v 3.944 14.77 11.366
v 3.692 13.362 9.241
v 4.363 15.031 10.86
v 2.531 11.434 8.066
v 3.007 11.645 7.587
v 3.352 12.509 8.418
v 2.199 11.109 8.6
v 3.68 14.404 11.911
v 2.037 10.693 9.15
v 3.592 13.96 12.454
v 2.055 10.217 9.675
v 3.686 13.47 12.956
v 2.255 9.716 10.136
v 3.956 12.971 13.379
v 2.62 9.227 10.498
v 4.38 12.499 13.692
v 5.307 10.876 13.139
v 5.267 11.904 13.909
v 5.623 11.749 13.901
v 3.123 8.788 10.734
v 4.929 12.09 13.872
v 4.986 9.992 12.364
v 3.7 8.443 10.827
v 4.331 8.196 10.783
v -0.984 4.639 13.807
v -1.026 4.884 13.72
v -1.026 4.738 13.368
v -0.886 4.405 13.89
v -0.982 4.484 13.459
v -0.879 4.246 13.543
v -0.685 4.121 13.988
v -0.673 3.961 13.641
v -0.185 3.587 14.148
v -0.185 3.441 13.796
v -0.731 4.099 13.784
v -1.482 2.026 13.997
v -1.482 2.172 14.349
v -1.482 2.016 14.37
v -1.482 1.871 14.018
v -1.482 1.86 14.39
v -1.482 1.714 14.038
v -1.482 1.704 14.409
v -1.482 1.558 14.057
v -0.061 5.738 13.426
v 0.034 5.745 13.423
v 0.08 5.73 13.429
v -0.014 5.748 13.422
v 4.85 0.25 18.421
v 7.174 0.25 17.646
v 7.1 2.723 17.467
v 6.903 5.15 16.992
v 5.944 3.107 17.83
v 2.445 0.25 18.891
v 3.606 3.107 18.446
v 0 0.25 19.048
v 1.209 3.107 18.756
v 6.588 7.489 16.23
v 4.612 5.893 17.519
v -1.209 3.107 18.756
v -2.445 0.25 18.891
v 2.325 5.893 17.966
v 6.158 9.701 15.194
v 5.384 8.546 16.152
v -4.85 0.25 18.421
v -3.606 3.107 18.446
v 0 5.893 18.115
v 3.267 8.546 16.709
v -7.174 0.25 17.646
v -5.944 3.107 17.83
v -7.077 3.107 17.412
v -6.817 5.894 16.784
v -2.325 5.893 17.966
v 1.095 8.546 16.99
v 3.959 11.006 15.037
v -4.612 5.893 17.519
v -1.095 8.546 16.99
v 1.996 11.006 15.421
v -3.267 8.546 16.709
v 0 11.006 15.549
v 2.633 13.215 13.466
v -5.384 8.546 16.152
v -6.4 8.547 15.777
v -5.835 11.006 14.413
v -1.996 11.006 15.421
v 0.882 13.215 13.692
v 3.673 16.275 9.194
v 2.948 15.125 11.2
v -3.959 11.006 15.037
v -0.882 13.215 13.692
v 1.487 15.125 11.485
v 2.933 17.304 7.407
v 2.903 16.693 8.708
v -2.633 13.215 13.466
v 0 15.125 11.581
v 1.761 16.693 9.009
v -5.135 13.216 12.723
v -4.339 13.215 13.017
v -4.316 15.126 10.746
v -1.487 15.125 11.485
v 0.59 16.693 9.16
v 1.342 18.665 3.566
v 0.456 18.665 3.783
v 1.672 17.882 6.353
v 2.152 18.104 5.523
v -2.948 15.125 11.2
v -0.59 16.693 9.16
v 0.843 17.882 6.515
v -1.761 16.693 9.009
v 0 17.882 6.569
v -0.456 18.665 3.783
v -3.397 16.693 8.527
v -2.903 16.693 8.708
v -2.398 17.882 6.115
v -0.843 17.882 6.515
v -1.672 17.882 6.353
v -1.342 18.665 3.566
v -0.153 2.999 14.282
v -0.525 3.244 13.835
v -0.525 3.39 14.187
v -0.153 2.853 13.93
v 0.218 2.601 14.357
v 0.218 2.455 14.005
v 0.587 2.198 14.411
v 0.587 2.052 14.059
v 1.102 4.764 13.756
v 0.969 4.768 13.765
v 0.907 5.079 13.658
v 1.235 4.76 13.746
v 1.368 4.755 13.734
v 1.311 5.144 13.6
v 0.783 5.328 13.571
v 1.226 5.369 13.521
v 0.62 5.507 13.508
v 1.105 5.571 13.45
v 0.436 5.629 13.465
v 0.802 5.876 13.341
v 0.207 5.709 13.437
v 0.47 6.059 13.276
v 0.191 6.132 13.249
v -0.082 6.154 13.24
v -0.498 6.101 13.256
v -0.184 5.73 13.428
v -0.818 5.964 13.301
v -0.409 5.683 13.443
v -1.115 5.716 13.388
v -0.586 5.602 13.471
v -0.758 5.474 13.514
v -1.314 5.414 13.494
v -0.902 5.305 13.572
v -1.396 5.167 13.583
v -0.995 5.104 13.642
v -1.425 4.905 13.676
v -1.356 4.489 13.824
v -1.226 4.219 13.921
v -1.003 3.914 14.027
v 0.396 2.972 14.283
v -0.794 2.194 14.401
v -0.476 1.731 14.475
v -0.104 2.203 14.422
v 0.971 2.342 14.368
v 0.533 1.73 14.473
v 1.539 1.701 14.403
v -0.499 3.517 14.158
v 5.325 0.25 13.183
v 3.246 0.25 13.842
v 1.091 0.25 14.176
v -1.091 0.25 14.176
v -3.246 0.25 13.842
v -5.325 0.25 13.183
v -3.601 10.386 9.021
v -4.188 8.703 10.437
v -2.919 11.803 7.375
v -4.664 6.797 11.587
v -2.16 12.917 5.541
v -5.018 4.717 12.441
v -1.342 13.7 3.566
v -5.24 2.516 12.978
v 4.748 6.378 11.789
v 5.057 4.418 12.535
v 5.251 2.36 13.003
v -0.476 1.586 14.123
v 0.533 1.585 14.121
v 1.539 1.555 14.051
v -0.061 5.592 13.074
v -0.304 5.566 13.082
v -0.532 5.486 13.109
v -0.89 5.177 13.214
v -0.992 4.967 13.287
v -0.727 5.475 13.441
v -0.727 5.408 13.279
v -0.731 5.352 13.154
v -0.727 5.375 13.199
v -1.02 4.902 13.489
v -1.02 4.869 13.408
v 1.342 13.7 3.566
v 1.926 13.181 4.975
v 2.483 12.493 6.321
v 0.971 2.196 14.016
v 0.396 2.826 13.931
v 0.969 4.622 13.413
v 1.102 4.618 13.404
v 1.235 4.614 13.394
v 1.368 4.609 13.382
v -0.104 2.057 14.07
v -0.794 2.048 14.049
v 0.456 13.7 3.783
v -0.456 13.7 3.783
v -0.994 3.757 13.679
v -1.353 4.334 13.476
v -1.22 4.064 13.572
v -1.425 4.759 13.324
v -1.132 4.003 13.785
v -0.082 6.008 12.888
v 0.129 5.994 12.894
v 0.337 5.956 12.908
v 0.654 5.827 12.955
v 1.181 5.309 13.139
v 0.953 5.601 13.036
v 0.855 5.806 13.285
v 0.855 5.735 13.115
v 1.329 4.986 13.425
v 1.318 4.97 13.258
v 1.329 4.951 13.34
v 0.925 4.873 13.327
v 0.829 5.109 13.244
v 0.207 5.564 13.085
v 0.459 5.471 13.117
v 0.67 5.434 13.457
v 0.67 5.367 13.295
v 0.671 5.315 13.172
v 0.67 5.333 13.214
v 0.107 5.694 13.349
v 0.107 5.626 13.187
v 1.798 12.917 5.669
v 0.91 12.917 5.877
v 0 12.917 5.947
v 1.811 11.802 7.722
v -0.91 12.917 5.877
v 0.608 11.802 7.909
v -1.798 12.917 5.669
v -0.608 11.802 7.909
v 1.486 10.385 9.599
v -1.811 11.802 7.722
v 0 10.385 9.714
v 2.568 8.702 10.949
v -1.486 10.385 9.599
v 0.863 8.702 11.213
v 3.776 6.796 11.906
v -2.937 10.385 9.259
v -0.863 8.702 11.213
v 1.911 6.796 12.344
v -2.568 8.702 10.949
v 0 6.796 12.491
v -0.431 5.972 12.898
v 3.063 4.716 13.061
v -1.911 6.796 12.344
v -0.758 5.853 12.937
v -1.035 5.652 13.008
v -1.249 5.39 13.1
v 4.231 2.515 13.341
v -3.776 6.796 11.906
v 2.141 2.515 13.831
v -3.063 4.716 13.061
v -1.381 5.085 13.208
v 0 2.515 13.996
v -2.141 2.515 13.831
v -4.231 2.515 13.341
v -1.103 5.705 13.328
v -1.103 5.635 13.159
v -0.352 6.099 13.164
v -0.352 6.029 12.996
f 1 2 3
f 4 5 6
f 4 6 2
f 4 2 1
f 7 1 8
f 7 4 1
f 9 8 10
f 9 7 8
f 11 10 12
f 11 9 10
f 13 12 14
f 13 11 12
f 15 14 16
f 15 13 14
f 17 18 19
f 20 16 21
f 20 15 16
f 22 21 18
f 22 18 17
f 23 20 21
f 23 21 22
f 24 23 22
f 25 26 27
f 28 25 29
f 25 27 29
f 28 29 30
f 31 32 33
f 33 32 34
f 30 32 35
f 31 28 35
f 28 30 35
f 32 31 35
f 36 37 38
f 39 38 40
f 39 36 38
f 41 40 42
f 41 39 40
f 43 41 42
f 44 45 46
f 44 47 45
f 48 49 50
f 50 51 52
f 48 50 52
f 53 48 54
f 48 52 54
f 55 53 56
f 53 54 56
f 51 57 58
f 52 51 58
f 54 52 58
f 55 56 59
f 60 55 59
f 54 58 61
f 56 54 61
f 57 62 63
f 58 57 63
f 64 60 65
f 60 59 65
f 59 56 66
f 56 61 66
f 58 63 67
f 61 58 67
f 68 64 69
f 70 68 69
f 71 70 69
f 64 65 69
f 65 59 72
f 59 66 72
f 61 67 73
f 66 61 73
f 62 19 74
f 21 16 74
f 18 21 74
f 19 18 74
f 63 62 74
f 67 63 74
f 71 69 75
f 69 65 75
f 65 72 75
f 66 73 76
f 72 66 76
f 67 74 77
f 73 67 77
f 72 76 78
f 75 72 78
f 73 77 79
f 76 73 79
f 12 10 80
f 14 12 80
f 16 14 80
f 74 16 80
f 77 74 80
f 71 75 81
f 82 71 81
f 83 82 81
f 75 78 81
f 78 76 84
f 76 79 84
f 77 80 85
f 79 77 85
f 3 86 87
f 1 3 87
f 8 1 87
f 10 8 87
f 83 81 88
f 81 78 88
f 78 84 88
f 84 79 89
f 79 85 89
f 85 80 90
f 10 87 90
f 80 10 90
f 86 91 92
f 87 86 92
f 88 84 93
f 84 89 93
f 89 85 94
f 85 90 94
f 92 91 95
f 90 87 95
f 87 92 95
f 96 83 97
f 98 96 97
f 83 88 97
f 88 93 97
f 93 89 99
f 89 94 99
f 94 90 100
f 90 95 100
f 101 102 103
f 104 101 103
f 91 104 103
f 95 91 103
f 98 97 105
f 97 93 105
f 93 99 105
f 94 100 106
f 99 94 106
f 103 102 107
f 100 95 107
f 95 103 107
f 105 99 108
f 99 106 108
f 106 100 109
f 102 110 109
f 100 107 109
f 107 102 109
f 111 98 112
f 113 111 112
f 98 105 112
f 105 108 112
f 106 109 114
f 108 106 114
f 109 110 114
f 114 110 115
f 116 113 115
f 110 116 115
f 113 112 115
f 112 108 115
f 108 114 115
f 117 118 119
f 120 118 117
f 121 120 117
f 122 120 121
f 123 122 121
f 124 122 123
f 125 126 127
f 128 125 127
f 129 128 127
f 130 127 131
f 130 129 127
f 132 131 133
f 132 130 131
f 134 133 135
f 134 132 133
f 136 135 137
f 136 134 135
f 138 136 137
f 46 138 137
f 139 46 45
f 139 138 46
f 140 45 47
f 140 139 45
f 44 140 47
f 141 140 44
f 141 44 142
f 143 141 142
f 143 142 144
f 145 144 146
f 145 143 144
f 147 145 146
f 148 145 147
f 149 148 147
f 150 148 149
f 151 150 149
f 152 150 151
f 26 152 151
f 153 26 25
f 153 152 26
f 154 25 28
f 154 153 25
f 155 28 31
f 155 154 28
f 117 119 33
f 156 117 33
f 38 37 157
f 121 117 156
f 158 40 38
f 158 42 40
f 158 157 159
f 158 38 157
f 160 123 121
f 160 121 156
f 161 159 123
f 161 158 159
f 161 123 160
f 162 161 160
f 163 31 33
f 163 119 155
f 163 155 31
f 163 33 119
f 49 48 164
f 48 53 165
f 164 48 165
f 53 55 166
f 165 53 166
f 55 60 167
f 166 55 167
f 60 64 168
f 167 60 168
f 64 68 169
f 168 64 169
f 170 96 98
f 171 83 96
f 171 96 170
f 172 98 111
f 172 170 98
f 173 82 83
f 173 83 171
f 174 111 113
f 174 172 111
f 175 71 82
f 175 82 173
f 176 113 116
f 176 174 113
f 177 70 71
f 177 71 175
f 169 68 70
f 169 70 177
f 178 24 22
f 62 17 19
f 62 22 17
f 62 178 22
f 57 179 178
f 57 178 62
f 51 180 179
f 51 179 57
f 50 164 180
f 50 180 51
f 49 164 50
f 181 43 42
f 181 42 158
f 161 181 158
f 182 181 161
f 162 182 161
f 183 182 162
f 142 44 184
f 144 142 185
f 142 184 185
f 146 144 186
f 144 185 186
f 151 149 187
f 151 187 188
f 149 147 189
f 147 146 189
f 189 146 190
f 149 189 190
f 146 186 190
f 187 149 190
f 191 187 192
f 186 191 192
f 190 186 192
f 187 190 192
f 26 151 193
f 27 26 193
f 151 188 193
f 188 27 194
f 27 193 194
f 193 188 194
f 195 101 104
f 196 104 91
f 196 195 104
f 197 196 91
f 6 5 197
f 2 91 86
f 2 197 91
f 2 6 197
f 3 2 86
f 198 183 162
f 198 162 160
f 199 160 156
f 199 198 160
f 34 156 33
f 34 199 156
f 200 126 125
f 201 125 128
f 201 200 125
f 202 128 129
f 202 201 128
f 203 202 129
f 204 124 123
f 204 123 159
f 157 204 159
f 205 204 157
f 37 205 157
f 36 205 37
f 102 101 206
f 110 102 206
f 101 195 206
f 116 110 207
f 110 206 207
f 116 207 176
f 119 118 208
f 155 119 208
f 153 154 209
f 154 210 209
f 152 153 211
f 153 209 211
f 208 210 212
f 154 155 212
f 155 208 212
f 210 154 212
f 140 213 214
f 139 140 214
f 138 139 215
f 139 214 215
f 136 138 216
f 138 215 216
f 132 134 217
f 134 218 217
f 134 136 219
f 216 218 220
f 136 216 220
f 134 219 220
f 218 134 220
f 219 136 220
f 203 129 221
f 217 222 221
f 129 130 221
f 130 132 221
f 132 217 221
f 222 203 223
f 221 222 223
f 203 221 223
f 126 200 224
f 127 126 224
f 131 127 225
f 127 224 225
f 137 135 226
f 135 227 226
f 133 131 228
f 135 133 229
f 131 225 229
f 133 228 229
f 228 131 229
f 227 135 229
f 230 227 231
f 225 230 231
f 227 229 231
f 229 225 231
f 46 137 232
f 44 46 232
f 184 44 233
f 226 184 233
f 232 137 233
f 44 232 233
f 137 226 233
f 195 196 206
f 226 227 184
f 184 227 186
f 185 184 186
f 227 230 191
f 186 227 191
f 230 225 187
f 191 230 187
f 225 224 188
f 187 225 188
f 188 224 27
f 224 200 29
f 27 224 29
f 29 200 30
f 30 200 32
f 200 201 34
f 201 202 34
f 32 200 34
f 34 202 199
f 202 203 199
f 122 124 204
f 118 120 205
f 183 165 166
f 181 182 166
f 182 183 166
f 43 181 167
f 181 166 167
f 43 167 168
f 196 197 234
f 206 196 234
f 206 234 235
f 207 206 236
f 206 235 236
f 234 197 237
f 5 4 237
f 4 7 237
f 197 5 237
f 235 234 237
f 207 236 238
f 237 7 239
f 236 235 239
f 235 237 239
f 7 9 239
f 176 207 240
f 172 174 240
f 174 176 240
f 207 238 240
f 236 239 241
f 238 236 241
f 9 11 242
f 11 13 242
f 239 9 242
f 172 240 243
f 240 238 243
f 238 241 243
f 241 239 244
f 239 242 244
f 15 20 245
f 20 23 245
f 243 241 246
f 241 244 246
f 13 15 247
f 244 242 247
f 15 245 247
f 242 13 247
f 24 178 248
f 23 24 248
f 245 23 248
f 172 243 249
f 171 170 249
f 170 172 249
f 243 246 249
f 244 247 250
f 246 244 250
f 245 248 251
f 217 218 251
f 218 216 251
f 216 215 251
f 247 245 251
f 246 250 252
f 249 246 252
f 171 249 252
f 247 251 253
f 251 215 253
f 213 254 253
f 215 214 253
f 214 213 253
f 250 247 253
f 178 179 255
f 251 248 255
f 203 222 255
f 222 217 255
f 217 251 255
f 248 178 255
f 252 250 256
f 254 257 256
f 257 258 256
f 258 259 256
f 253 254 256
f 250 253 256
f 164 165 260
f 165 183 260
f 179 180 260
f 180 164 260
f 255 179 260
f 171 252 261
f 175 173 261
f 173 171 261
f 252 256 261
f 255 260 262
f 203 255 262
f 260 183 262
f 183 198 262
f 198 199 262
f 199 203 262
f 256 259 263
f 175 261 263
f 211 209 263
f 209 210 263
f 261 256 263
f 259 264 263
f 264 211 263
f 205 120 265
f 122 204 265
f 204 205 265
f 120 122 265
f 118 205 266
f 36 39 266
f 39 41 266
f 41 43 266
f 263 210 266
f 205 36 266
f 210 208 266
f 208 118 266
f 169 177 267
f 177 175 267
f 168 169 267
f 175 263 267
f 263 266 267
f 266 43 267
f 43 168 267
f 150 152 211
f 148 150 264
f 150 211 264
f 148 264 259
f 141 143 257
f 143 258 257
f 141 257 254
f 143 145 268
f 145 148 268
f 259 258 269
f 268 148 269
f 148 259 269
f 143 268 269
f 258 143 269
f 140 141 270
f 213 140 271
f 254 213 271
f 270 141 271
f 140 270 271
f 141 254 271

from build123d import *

# Parameters (mm, degrees)
REVOLVE1_ANGLE          = 45
CUT_EXTRUDE1_DEPTH      = 28.647117169
CUT_EXTRUDE1_DEPTH_BACK = 28.647117169
CUT_EXTRUDE4_START      = 13.576367639
CUT_EXTRUDE4_DEPTH      = 0.380999994
CUT_EXTRUDE4_START_2    = 13.957367633
CUT_EXTRUDE4_2_DEPTH    = 0.642564002
CUT_EXTRUDE5_DEPTH      = 28.732730484
CUT_EXTRUDE5_DEPTH_BACK = 28.732730484
SKETCH9_R               = 2.6035


with BuildPart() as part:
    # Sketch1 → Revolve1 (revolve, symmetric)
    with BuildSketch(Plane(origin=(0, 0, 0), x_dir=(0, 0, -1), z_dir=(1, 0, 0))) as revolve1_sk:
        with BuildLine():
            Line((-14.217802221, 0.25), (-19.048359509, 0.25))
            ThreePointArc((-19.048359509, 0.25), (-14.676690222, 12.144845166), (-3.81, 18.66511184))
            Line((-3.81, 18.66511184), (-3.81, 13.700083941))
            ThreePointArc((-3.81, 13.700083941), (-11.246181696, 8.70240181), (-14.217802221, 0.25))
        make_face()
    revolve(axis=Axis((0, 0, 0), (0, 1, 0)), revolution_arc=REVOLVE1_ANGLE / 2)
    revolve(revolve1_sk.sketch, axis=Axis((0, 0, 0), (0, -1, 0)), revolution_arc=REVOLVE1_ANGLE / 2)

    # Sketch2 → Cut-Extrude1 (cut, two sides: drawn at the far end of the back side and taken through both)
    with BuildSketch(Plane(origin=(0, 0, 0), x_dir=(1, 0, 0), z_dir=(0, 1, 0)).offset(-CUT_EXTRUDE1_DEPTH_BACK)):
        with BuildLine():
            Line((7.289491598, -17.598389479), (1.458023877, -3.519981019))
            ThreePointArc((1.458023877, -3.519981019), (1.400077392, -3.543428184), (1.341754023, -3.5659215))
            Line((1.341754023, -3.5659215), (7.173849701, -17.645845983))
            ThreePointArc((7.173849701, -17.645845983), (7.231709577, -17.622212591), (7.289491598, -17.598389479))
        make_face()
        with BuildLine():
            Line((-7.173849701, -17.645845983), (-1.341754023, -3.5659215))
            ThreePointArc((-1.341754023, -3.5659215), (-1.400077392, -3.543428184), (-1.458023877, -3.519981019))
            Line((-1.458023877, -3.519981019), (-7.289491598, -17.598389479))
            ThreePointArc((-7.289491598, -17.598389479), (-7.231709577, -17.622212591), (-7.173849701, -17.645845983))
        make_face()
    extrude(amount=CUT_EXTRUDE1_DEPTH + CUT_EXTRUDE1_DEPTH_BACK, mode=Mode.SUBTRACT)

    # Cut-Extrude4: read off the stored shape, not the designer's step
    # Cut-Extrude4 outline → Cut-Extrude4 (cut)
    with BuildSketch(Plane(origin=(0, 0, 0), x_dir=(-1, 0, 0), z_dir=(0, 0.3826834323650899, 0.9238795325112868)).offset(CUT_EXTRUDE4_START)):
        with BuildLine():
            add(Edge.make_bspline(
                [(-0.968782051, 0.862639779), (-0.953500776, 0.704297035), (-0.923044848, 0.542890698), (-0.855145508, 0.398864139), (-0.808724978, 0.30039795), (-0.745897012, 0.207923685), (-0.670245705, 0.129565817), (-0.594412641, 0.051019689), (-0.503545716, -0.015548318), (-0.405099082, -0.062878158), (-0.311601318, -0.107828748), (-0.209546118, -0.137449131), (-0.106757843, -0.151684794), (-0.05109477, -0.159393852), (0.005262189, -0.1617206), (0.061439303, -0.163129452)],
                knots=[0, 0, 0, 0, 0.29838771, 0.29838771, 0.29838771, 0.500936586, 0.500936586, 0.500936586, 0.704289141, 0.704289141, 0.704289141, 0.896734057, 0.896734057, 0.896734057, 1, 1, 1, 1], degree=3))
            Line((-0.968782051, 0.862639779), (-1.367692308, 0.862639779))
            add(Edge.make_bspline(
                [(0.081919071, -0.619026887), (-0.086162496, -0.61531723), (-0.257167265, -0.593217389), (-0.415863302, -0.537759882), (-0.576051263, -0.481781012), (-0.72706091, -0.391594396), (-0.854625463, -0.279801274), (-0.966467496, -0.181786819), (-1.065524634, -0.066561713), (-1.143726934, 0.059834888), (-1.232584949, 0.203454079), (-1.294864437, 0.365862515), (-1.329447249, 0.531081722), (-1.352245152, 0.639998589), (-1.362236386, 0.751562149), (-1.367692308, 0.862639779)],
                knots=[0, 0, 0, 0, 0.219321271, 0.219321271, 0.219321271, 0.441568871, 0.441568871, 0.441568871, 0.635043827, 0.635043827, 0.635043827, 0.85588519, 0.85588519, 0.85588519, 1, 1, 1, 1], degree=3))
            add(Edge.make_bspline(
                [(1.424679487, 0.702363337), (1.419981236, 0.545512864), (1.398709626, 0.385831481), (1.345210286, 0.238274474), (1.291294192, 0.089568013), (1.206545942, -0.050106462), (1.103378814, -0.170072469), (1.007347044, -0.281741256), (0.89204272, -0.380253902), (0.763987364, -0.453127945), (0.63762939, -0.525036038), (0.495452933, -0.572269115), (0.352111836, -0.596853545), (0.263052547, -0.612128103), (0.172266933, -0.616929095), (0.081919071, -0.619026887)],
                knots=[0, 0, 0, 0, 0.2250597, 0.2250597, 0.2250597, 0.452233869, 0.452233869, 0.452233869, 0.663328732, 0.663328732, 0.663328732, 0.871773853, 0.871773853, 0.871773853, 1, 1, 1, 1], degree=3))
            add(Edge.make_bspline(
                [(0.525350561, 2.297113938), (0.632201272, 2.182552925), (0.739042665, 2.067510357), (0.841026473, 1.948138788), (0.943081147, 1.828684271), (1.042867018, 1.706551704), (1.132291654, 1.577154573), (1.222325588, 1.446875791), (1.302241046, 1.306213708), (1.351938808, 1.155861709), (1.399991449, 1.01048674), (1.419363896, 0.85539296), (1.424679487, 0.702363337)],
                knots=[0, 0, 0, 0, 0.250309738, 0.250309738, 0.250309738, 0.500902382, 0.500902382, 0.500902382, 0.754675063, 0.754675063, 0.754675063, 1, 1, 1, 1], degree=3))
            Line((0.525350561, 2.297113938), (-0.586789864, 3.484050036))
            Line((-0.586789864, 3.484050036), (1.481666667, 3.484050036))
            Line((1.481666667, 3.484050036), (1.481666667, 3.939947472))
            Line((1.481666667, 3.939947472), (-1.538653846, 3.939947472))
            Line((-1.538653846, 3.939947472), (0.185208333, 2.100330084))
            add(Edge.make_bspline(
                [(1.025769231, 0.737980324), (1.015103197, 1.014455984), (0.898431748, 1.272392114), (0.563340129, 1.703651021), (0.374186439, 1.903082751), (0.185208333, 2.100330084)],
                knots=[0, 0, 0, 0, 0.5, 0.5, 1, 1, 1, 1], degree=3))
            add(Edge.make_bspline(
                [(0.061439303, -0.163129452), (0.181431455, -0.159946897), (0.303817751, -0.144655767), (0.416529018, -0.103477757), (0.530319754, -0.061905373), (0.636925683, 0.00439439), (0.726940524, 0.085370693), (0.806313998, 0.156774146), (0.876464564, 0.241486679), (0.926661814, 0.335660386), (0.975537276, 0.427354324), (1.007932207, 0.529885904), (1.019839954, 0.633102375), (1.023852868, 0.667886351), (1.024847174, 0.702980304), (1.025769231, 0.737980324)],
                knots=[0, 0, 0, 0, 0.246669413, 0.246669413, 0.246669413, 0.496293306, 0.496293306, 0.496293306, 0.715573497, 0.715573497, 0.715573497, 0.929171565, 0.929171565, 0.929171565, 1, 1, 1, 1], degree=3))
        make_face()
    extrude(amount=CUT_EXTRUDE4_DEPTH, mode=Mode.SUBTRACT)

    # Cut-Extrude4 2 outline → Cut-Extrude4 2 (cut)
    with BuildSketch(Plane(origin=(0, 0, 0), x_dir=(1, 0, 0), z_dir=(0, 0.38268343236508995, 0.9238795325112867)).offset(CUT_EXTRUDE4_START_2)):
        with BuildLine():
            add(Edge.make_bspline(
                [(0.968782051, -0.862639779), (0.953500776, -0.704297035), (0.923044848, -0.542890698), (0.855145508, -0.398864139), (0.808724978, -0.30039795), (0.745897012, -0.207923685), (0.670245705, -0.129565817), (0.594412641, -0.051019689), (0.503545716, 0.015548318), (0.405099082, 0.062878158), (0.311601318, 0.107828748), (0.209546118, 0.137449131), (0.106757843, 0.151684794), (0.05109477, 0.159393852), (-0.005262189, 0.1617206), (-0.061439303, 0.163129452)],
                knots=[0, 0, 0, 0, 0.29838771, 0.29838771, 0.29838771, 0.500936586, 0.500936586, 0.500936586, 0.704289141, 0.704289141, 0.704289141, 0.896734057, 0.896734057, 0.896734057, 1, 1, 1, 1], degree=3))
            Line((0.968782051, -0.862639779), (1.367692308, -0.862639779))
            add(Edge.make_bspline(
                [(-0.081919071, 0.619026887), (0.086162496, 0.61531723), (0.257167265, 0.593217389), (0.415863302, 0.537759882), (0.576051263, 0.481781012), (0.72706091, 0.391594396), (0.854625463, 0.279801274), (0.966467496, 0.181786819), (1.065524634, 0.066561713), (1.143726934, -0.059834888), (1.232584949, -0.203454079), (1.294864437, -0.365862515), (1.329447249, -0.531081722), (1.352245152, -0.639998589), (1.362236386, -0.751562149), (1.367692308, -0.862639779)],
                knots=[0, 0, 0, 0, 0.219321271, 0.219321271, 0.219321271, 0.441568871, 0.441568871, 0.441568871, 0.635043827, 0.635043827, 0.635043827, 0.85588519, 0.85588519, 0.85588519, 1, 1, 1, 1], degree=3))
            add(Edge.make_bspline(
                [(-1.424679487, -0.702363337), (-1.419981236, -0.545512864), (-1.398709626, -0.385831481), (-1.345210286, -0.238274474), (-1.291294192, -0.089568013), (-1.206545942, 0.050106462), (-1.103378814, 0.170072469), (-1.007347044, 0.281741256), (-0.89204272, 0.380253902), (-0.763987364, 0.453127945), (-0.63762939, 0.525036038), (-0.495452933, 0.572269115), (-0.352111836, 0.596853545), (-0.263052547, 0.612128103), (-0.172266933, 0.616929095), (-0.081919071, 0.619026887)],
                knots=[0, 0, 0, 0, 0.2250597, 0.2250597, 0.2250597, 0.452233869, 0.452233869, 0.452233869, 0.663328732, 0.663328732, 0.663328732, 0.871773853, 0.871773853, 0.871773853, 1, 1, 1, 1], degree=3))
            add(Edge.make_bspline(
                [(-0.525350561, -2.297113938), (-0.632201272, -2.182552925), (-0.739042665, -2.067510357), (-0.841026473, -1.948138788), (-0.943081147, -1.828684271), (-1.042867018, -1.706551704), (-1.132291654, -1.577154573), (-1.222325588, -1.446875791), (-1.302241046, -1.306213708), (-1.351938808, -1.155861709), (-1.399991449, -1.01048674), (-1.419363896, -0.85539296), (-1.424679487, -0.702363337)],
                knots=[0, 0, 0, 0, 0.250309738, 0.250309738, 0.250309738, 0.500902382, 0.500902382, 0.500902382, 0.754675063, 0.754675063, 0.754675063, 1, 1, 1, 1], degree=3))
            Line((-0.525350561, -2.297113938), (0.586789864, -3.484050036))
            Line((0.586789864, -3.484050036), (-1.481666667, -3.484050036))
            Line((-1.481666667, -3.484050036), (-1.481666667, -3.939947472))
            Line((-1.481666667, -3.939947472), (1.538653846, -3.939947472))
            Line((1.538653846, -3.939947472), (-0.185208333, -2.100330084))
            add(Edge.make_bspline(
                [(-1.025769231, -0.737980324), (-1.015103197, -1.014455984), (-0.898431748, -1.272392114), (-0.563340129, -1.703651021), (-0.374186439, -1.903082751), (-0.185208333, -2.100330084)],
                knots=[0, 0, 0, 0, 0.5, 0.5, 1, 1, 1, 1], degree=3))
            add(Edge.make_bspline(
                [(-0.061439303, 0.163129452), (-0.181431455, 0.159946897), (-0.303817751, 0.144655767), (-0.416529018, 0.103477757), (-0.530319754, 0.061905373), (-0.636925683, -0.00439439), (-0.726940524, -0.085370693), (-0.806313998, -0.156774146), (-0.876464564, -0.241486679), (-0.926661814, -0.335660386), (-0.975537276, -0.427354324), (-1.007932207, -0.529885904), (-1.019839954, -0.633102375), (-1.023852868, -0.667886351), (-1.024847174, -0.702980304), (-1.025769231, -0.737980324)],
                knots=[0, 0, 0, 0, 0.246669413, 0.246669413, 0.246669413, 0.496293306, 0.496293306, 0.496293306, 0.715573497, 0.715573497, 0.715573497, 0.929171565, 0.929171565, 0.929171565, 1, 1, 1, 1], degree=3))
        make_face()
    extrude(amount=CUT_EXTRUDE4_2_DEPTH, mode=Mode.SUBTRACT)

    # Cut-Extrude4 3 outline → Cut-Extrude4 3 (revolve)
    with BuildSketch(Plane(origin=(0, 0, 0), x_dir=(1, 0, 0), z_dir=(0, -0.9238795325112867, 0.38268343236508995))):
        with BuildLine():
            ThreePointArc((0.174307658, 14.599931635), (2.22533499, 14.425795626), (4.229733075, 13.957367633))
            Line((4.229733075, 13.957367633), (4.229733075, 14.599931635))
            Line((4.229733075, 14.599931635), (0.174307658, 14.599931635))
        make_face()
    revolve(axis=Axis((0, 0, 0), (0, 0.38268343236508995, 0.9238795325112867)))

    # Sketch9 → Cut-Extrude5 (cut, two sides: drawn at the far end of the back side and taken through both)
    with BuildSketch(Plane(origin=(8.561597025, 18.858537854, 16.803080265), x_dir=(0.9470724962077209, -0.23968096505674558, -0.2135573035893259), z_dir=(0.32101976096009477, 0.7071067811865476, 0.6300367553350547)).offset(-CUT_EXTRUDE5_DEPTH_BACK)):
        Circle(SKETCH9_R)
    extrude(amount=CUT_EXTRUDE5_DEPTH + CUT_EXTRUDE5_DEPTH_BACK, mode=Mode.SUBTRACT)


solid = part.part
